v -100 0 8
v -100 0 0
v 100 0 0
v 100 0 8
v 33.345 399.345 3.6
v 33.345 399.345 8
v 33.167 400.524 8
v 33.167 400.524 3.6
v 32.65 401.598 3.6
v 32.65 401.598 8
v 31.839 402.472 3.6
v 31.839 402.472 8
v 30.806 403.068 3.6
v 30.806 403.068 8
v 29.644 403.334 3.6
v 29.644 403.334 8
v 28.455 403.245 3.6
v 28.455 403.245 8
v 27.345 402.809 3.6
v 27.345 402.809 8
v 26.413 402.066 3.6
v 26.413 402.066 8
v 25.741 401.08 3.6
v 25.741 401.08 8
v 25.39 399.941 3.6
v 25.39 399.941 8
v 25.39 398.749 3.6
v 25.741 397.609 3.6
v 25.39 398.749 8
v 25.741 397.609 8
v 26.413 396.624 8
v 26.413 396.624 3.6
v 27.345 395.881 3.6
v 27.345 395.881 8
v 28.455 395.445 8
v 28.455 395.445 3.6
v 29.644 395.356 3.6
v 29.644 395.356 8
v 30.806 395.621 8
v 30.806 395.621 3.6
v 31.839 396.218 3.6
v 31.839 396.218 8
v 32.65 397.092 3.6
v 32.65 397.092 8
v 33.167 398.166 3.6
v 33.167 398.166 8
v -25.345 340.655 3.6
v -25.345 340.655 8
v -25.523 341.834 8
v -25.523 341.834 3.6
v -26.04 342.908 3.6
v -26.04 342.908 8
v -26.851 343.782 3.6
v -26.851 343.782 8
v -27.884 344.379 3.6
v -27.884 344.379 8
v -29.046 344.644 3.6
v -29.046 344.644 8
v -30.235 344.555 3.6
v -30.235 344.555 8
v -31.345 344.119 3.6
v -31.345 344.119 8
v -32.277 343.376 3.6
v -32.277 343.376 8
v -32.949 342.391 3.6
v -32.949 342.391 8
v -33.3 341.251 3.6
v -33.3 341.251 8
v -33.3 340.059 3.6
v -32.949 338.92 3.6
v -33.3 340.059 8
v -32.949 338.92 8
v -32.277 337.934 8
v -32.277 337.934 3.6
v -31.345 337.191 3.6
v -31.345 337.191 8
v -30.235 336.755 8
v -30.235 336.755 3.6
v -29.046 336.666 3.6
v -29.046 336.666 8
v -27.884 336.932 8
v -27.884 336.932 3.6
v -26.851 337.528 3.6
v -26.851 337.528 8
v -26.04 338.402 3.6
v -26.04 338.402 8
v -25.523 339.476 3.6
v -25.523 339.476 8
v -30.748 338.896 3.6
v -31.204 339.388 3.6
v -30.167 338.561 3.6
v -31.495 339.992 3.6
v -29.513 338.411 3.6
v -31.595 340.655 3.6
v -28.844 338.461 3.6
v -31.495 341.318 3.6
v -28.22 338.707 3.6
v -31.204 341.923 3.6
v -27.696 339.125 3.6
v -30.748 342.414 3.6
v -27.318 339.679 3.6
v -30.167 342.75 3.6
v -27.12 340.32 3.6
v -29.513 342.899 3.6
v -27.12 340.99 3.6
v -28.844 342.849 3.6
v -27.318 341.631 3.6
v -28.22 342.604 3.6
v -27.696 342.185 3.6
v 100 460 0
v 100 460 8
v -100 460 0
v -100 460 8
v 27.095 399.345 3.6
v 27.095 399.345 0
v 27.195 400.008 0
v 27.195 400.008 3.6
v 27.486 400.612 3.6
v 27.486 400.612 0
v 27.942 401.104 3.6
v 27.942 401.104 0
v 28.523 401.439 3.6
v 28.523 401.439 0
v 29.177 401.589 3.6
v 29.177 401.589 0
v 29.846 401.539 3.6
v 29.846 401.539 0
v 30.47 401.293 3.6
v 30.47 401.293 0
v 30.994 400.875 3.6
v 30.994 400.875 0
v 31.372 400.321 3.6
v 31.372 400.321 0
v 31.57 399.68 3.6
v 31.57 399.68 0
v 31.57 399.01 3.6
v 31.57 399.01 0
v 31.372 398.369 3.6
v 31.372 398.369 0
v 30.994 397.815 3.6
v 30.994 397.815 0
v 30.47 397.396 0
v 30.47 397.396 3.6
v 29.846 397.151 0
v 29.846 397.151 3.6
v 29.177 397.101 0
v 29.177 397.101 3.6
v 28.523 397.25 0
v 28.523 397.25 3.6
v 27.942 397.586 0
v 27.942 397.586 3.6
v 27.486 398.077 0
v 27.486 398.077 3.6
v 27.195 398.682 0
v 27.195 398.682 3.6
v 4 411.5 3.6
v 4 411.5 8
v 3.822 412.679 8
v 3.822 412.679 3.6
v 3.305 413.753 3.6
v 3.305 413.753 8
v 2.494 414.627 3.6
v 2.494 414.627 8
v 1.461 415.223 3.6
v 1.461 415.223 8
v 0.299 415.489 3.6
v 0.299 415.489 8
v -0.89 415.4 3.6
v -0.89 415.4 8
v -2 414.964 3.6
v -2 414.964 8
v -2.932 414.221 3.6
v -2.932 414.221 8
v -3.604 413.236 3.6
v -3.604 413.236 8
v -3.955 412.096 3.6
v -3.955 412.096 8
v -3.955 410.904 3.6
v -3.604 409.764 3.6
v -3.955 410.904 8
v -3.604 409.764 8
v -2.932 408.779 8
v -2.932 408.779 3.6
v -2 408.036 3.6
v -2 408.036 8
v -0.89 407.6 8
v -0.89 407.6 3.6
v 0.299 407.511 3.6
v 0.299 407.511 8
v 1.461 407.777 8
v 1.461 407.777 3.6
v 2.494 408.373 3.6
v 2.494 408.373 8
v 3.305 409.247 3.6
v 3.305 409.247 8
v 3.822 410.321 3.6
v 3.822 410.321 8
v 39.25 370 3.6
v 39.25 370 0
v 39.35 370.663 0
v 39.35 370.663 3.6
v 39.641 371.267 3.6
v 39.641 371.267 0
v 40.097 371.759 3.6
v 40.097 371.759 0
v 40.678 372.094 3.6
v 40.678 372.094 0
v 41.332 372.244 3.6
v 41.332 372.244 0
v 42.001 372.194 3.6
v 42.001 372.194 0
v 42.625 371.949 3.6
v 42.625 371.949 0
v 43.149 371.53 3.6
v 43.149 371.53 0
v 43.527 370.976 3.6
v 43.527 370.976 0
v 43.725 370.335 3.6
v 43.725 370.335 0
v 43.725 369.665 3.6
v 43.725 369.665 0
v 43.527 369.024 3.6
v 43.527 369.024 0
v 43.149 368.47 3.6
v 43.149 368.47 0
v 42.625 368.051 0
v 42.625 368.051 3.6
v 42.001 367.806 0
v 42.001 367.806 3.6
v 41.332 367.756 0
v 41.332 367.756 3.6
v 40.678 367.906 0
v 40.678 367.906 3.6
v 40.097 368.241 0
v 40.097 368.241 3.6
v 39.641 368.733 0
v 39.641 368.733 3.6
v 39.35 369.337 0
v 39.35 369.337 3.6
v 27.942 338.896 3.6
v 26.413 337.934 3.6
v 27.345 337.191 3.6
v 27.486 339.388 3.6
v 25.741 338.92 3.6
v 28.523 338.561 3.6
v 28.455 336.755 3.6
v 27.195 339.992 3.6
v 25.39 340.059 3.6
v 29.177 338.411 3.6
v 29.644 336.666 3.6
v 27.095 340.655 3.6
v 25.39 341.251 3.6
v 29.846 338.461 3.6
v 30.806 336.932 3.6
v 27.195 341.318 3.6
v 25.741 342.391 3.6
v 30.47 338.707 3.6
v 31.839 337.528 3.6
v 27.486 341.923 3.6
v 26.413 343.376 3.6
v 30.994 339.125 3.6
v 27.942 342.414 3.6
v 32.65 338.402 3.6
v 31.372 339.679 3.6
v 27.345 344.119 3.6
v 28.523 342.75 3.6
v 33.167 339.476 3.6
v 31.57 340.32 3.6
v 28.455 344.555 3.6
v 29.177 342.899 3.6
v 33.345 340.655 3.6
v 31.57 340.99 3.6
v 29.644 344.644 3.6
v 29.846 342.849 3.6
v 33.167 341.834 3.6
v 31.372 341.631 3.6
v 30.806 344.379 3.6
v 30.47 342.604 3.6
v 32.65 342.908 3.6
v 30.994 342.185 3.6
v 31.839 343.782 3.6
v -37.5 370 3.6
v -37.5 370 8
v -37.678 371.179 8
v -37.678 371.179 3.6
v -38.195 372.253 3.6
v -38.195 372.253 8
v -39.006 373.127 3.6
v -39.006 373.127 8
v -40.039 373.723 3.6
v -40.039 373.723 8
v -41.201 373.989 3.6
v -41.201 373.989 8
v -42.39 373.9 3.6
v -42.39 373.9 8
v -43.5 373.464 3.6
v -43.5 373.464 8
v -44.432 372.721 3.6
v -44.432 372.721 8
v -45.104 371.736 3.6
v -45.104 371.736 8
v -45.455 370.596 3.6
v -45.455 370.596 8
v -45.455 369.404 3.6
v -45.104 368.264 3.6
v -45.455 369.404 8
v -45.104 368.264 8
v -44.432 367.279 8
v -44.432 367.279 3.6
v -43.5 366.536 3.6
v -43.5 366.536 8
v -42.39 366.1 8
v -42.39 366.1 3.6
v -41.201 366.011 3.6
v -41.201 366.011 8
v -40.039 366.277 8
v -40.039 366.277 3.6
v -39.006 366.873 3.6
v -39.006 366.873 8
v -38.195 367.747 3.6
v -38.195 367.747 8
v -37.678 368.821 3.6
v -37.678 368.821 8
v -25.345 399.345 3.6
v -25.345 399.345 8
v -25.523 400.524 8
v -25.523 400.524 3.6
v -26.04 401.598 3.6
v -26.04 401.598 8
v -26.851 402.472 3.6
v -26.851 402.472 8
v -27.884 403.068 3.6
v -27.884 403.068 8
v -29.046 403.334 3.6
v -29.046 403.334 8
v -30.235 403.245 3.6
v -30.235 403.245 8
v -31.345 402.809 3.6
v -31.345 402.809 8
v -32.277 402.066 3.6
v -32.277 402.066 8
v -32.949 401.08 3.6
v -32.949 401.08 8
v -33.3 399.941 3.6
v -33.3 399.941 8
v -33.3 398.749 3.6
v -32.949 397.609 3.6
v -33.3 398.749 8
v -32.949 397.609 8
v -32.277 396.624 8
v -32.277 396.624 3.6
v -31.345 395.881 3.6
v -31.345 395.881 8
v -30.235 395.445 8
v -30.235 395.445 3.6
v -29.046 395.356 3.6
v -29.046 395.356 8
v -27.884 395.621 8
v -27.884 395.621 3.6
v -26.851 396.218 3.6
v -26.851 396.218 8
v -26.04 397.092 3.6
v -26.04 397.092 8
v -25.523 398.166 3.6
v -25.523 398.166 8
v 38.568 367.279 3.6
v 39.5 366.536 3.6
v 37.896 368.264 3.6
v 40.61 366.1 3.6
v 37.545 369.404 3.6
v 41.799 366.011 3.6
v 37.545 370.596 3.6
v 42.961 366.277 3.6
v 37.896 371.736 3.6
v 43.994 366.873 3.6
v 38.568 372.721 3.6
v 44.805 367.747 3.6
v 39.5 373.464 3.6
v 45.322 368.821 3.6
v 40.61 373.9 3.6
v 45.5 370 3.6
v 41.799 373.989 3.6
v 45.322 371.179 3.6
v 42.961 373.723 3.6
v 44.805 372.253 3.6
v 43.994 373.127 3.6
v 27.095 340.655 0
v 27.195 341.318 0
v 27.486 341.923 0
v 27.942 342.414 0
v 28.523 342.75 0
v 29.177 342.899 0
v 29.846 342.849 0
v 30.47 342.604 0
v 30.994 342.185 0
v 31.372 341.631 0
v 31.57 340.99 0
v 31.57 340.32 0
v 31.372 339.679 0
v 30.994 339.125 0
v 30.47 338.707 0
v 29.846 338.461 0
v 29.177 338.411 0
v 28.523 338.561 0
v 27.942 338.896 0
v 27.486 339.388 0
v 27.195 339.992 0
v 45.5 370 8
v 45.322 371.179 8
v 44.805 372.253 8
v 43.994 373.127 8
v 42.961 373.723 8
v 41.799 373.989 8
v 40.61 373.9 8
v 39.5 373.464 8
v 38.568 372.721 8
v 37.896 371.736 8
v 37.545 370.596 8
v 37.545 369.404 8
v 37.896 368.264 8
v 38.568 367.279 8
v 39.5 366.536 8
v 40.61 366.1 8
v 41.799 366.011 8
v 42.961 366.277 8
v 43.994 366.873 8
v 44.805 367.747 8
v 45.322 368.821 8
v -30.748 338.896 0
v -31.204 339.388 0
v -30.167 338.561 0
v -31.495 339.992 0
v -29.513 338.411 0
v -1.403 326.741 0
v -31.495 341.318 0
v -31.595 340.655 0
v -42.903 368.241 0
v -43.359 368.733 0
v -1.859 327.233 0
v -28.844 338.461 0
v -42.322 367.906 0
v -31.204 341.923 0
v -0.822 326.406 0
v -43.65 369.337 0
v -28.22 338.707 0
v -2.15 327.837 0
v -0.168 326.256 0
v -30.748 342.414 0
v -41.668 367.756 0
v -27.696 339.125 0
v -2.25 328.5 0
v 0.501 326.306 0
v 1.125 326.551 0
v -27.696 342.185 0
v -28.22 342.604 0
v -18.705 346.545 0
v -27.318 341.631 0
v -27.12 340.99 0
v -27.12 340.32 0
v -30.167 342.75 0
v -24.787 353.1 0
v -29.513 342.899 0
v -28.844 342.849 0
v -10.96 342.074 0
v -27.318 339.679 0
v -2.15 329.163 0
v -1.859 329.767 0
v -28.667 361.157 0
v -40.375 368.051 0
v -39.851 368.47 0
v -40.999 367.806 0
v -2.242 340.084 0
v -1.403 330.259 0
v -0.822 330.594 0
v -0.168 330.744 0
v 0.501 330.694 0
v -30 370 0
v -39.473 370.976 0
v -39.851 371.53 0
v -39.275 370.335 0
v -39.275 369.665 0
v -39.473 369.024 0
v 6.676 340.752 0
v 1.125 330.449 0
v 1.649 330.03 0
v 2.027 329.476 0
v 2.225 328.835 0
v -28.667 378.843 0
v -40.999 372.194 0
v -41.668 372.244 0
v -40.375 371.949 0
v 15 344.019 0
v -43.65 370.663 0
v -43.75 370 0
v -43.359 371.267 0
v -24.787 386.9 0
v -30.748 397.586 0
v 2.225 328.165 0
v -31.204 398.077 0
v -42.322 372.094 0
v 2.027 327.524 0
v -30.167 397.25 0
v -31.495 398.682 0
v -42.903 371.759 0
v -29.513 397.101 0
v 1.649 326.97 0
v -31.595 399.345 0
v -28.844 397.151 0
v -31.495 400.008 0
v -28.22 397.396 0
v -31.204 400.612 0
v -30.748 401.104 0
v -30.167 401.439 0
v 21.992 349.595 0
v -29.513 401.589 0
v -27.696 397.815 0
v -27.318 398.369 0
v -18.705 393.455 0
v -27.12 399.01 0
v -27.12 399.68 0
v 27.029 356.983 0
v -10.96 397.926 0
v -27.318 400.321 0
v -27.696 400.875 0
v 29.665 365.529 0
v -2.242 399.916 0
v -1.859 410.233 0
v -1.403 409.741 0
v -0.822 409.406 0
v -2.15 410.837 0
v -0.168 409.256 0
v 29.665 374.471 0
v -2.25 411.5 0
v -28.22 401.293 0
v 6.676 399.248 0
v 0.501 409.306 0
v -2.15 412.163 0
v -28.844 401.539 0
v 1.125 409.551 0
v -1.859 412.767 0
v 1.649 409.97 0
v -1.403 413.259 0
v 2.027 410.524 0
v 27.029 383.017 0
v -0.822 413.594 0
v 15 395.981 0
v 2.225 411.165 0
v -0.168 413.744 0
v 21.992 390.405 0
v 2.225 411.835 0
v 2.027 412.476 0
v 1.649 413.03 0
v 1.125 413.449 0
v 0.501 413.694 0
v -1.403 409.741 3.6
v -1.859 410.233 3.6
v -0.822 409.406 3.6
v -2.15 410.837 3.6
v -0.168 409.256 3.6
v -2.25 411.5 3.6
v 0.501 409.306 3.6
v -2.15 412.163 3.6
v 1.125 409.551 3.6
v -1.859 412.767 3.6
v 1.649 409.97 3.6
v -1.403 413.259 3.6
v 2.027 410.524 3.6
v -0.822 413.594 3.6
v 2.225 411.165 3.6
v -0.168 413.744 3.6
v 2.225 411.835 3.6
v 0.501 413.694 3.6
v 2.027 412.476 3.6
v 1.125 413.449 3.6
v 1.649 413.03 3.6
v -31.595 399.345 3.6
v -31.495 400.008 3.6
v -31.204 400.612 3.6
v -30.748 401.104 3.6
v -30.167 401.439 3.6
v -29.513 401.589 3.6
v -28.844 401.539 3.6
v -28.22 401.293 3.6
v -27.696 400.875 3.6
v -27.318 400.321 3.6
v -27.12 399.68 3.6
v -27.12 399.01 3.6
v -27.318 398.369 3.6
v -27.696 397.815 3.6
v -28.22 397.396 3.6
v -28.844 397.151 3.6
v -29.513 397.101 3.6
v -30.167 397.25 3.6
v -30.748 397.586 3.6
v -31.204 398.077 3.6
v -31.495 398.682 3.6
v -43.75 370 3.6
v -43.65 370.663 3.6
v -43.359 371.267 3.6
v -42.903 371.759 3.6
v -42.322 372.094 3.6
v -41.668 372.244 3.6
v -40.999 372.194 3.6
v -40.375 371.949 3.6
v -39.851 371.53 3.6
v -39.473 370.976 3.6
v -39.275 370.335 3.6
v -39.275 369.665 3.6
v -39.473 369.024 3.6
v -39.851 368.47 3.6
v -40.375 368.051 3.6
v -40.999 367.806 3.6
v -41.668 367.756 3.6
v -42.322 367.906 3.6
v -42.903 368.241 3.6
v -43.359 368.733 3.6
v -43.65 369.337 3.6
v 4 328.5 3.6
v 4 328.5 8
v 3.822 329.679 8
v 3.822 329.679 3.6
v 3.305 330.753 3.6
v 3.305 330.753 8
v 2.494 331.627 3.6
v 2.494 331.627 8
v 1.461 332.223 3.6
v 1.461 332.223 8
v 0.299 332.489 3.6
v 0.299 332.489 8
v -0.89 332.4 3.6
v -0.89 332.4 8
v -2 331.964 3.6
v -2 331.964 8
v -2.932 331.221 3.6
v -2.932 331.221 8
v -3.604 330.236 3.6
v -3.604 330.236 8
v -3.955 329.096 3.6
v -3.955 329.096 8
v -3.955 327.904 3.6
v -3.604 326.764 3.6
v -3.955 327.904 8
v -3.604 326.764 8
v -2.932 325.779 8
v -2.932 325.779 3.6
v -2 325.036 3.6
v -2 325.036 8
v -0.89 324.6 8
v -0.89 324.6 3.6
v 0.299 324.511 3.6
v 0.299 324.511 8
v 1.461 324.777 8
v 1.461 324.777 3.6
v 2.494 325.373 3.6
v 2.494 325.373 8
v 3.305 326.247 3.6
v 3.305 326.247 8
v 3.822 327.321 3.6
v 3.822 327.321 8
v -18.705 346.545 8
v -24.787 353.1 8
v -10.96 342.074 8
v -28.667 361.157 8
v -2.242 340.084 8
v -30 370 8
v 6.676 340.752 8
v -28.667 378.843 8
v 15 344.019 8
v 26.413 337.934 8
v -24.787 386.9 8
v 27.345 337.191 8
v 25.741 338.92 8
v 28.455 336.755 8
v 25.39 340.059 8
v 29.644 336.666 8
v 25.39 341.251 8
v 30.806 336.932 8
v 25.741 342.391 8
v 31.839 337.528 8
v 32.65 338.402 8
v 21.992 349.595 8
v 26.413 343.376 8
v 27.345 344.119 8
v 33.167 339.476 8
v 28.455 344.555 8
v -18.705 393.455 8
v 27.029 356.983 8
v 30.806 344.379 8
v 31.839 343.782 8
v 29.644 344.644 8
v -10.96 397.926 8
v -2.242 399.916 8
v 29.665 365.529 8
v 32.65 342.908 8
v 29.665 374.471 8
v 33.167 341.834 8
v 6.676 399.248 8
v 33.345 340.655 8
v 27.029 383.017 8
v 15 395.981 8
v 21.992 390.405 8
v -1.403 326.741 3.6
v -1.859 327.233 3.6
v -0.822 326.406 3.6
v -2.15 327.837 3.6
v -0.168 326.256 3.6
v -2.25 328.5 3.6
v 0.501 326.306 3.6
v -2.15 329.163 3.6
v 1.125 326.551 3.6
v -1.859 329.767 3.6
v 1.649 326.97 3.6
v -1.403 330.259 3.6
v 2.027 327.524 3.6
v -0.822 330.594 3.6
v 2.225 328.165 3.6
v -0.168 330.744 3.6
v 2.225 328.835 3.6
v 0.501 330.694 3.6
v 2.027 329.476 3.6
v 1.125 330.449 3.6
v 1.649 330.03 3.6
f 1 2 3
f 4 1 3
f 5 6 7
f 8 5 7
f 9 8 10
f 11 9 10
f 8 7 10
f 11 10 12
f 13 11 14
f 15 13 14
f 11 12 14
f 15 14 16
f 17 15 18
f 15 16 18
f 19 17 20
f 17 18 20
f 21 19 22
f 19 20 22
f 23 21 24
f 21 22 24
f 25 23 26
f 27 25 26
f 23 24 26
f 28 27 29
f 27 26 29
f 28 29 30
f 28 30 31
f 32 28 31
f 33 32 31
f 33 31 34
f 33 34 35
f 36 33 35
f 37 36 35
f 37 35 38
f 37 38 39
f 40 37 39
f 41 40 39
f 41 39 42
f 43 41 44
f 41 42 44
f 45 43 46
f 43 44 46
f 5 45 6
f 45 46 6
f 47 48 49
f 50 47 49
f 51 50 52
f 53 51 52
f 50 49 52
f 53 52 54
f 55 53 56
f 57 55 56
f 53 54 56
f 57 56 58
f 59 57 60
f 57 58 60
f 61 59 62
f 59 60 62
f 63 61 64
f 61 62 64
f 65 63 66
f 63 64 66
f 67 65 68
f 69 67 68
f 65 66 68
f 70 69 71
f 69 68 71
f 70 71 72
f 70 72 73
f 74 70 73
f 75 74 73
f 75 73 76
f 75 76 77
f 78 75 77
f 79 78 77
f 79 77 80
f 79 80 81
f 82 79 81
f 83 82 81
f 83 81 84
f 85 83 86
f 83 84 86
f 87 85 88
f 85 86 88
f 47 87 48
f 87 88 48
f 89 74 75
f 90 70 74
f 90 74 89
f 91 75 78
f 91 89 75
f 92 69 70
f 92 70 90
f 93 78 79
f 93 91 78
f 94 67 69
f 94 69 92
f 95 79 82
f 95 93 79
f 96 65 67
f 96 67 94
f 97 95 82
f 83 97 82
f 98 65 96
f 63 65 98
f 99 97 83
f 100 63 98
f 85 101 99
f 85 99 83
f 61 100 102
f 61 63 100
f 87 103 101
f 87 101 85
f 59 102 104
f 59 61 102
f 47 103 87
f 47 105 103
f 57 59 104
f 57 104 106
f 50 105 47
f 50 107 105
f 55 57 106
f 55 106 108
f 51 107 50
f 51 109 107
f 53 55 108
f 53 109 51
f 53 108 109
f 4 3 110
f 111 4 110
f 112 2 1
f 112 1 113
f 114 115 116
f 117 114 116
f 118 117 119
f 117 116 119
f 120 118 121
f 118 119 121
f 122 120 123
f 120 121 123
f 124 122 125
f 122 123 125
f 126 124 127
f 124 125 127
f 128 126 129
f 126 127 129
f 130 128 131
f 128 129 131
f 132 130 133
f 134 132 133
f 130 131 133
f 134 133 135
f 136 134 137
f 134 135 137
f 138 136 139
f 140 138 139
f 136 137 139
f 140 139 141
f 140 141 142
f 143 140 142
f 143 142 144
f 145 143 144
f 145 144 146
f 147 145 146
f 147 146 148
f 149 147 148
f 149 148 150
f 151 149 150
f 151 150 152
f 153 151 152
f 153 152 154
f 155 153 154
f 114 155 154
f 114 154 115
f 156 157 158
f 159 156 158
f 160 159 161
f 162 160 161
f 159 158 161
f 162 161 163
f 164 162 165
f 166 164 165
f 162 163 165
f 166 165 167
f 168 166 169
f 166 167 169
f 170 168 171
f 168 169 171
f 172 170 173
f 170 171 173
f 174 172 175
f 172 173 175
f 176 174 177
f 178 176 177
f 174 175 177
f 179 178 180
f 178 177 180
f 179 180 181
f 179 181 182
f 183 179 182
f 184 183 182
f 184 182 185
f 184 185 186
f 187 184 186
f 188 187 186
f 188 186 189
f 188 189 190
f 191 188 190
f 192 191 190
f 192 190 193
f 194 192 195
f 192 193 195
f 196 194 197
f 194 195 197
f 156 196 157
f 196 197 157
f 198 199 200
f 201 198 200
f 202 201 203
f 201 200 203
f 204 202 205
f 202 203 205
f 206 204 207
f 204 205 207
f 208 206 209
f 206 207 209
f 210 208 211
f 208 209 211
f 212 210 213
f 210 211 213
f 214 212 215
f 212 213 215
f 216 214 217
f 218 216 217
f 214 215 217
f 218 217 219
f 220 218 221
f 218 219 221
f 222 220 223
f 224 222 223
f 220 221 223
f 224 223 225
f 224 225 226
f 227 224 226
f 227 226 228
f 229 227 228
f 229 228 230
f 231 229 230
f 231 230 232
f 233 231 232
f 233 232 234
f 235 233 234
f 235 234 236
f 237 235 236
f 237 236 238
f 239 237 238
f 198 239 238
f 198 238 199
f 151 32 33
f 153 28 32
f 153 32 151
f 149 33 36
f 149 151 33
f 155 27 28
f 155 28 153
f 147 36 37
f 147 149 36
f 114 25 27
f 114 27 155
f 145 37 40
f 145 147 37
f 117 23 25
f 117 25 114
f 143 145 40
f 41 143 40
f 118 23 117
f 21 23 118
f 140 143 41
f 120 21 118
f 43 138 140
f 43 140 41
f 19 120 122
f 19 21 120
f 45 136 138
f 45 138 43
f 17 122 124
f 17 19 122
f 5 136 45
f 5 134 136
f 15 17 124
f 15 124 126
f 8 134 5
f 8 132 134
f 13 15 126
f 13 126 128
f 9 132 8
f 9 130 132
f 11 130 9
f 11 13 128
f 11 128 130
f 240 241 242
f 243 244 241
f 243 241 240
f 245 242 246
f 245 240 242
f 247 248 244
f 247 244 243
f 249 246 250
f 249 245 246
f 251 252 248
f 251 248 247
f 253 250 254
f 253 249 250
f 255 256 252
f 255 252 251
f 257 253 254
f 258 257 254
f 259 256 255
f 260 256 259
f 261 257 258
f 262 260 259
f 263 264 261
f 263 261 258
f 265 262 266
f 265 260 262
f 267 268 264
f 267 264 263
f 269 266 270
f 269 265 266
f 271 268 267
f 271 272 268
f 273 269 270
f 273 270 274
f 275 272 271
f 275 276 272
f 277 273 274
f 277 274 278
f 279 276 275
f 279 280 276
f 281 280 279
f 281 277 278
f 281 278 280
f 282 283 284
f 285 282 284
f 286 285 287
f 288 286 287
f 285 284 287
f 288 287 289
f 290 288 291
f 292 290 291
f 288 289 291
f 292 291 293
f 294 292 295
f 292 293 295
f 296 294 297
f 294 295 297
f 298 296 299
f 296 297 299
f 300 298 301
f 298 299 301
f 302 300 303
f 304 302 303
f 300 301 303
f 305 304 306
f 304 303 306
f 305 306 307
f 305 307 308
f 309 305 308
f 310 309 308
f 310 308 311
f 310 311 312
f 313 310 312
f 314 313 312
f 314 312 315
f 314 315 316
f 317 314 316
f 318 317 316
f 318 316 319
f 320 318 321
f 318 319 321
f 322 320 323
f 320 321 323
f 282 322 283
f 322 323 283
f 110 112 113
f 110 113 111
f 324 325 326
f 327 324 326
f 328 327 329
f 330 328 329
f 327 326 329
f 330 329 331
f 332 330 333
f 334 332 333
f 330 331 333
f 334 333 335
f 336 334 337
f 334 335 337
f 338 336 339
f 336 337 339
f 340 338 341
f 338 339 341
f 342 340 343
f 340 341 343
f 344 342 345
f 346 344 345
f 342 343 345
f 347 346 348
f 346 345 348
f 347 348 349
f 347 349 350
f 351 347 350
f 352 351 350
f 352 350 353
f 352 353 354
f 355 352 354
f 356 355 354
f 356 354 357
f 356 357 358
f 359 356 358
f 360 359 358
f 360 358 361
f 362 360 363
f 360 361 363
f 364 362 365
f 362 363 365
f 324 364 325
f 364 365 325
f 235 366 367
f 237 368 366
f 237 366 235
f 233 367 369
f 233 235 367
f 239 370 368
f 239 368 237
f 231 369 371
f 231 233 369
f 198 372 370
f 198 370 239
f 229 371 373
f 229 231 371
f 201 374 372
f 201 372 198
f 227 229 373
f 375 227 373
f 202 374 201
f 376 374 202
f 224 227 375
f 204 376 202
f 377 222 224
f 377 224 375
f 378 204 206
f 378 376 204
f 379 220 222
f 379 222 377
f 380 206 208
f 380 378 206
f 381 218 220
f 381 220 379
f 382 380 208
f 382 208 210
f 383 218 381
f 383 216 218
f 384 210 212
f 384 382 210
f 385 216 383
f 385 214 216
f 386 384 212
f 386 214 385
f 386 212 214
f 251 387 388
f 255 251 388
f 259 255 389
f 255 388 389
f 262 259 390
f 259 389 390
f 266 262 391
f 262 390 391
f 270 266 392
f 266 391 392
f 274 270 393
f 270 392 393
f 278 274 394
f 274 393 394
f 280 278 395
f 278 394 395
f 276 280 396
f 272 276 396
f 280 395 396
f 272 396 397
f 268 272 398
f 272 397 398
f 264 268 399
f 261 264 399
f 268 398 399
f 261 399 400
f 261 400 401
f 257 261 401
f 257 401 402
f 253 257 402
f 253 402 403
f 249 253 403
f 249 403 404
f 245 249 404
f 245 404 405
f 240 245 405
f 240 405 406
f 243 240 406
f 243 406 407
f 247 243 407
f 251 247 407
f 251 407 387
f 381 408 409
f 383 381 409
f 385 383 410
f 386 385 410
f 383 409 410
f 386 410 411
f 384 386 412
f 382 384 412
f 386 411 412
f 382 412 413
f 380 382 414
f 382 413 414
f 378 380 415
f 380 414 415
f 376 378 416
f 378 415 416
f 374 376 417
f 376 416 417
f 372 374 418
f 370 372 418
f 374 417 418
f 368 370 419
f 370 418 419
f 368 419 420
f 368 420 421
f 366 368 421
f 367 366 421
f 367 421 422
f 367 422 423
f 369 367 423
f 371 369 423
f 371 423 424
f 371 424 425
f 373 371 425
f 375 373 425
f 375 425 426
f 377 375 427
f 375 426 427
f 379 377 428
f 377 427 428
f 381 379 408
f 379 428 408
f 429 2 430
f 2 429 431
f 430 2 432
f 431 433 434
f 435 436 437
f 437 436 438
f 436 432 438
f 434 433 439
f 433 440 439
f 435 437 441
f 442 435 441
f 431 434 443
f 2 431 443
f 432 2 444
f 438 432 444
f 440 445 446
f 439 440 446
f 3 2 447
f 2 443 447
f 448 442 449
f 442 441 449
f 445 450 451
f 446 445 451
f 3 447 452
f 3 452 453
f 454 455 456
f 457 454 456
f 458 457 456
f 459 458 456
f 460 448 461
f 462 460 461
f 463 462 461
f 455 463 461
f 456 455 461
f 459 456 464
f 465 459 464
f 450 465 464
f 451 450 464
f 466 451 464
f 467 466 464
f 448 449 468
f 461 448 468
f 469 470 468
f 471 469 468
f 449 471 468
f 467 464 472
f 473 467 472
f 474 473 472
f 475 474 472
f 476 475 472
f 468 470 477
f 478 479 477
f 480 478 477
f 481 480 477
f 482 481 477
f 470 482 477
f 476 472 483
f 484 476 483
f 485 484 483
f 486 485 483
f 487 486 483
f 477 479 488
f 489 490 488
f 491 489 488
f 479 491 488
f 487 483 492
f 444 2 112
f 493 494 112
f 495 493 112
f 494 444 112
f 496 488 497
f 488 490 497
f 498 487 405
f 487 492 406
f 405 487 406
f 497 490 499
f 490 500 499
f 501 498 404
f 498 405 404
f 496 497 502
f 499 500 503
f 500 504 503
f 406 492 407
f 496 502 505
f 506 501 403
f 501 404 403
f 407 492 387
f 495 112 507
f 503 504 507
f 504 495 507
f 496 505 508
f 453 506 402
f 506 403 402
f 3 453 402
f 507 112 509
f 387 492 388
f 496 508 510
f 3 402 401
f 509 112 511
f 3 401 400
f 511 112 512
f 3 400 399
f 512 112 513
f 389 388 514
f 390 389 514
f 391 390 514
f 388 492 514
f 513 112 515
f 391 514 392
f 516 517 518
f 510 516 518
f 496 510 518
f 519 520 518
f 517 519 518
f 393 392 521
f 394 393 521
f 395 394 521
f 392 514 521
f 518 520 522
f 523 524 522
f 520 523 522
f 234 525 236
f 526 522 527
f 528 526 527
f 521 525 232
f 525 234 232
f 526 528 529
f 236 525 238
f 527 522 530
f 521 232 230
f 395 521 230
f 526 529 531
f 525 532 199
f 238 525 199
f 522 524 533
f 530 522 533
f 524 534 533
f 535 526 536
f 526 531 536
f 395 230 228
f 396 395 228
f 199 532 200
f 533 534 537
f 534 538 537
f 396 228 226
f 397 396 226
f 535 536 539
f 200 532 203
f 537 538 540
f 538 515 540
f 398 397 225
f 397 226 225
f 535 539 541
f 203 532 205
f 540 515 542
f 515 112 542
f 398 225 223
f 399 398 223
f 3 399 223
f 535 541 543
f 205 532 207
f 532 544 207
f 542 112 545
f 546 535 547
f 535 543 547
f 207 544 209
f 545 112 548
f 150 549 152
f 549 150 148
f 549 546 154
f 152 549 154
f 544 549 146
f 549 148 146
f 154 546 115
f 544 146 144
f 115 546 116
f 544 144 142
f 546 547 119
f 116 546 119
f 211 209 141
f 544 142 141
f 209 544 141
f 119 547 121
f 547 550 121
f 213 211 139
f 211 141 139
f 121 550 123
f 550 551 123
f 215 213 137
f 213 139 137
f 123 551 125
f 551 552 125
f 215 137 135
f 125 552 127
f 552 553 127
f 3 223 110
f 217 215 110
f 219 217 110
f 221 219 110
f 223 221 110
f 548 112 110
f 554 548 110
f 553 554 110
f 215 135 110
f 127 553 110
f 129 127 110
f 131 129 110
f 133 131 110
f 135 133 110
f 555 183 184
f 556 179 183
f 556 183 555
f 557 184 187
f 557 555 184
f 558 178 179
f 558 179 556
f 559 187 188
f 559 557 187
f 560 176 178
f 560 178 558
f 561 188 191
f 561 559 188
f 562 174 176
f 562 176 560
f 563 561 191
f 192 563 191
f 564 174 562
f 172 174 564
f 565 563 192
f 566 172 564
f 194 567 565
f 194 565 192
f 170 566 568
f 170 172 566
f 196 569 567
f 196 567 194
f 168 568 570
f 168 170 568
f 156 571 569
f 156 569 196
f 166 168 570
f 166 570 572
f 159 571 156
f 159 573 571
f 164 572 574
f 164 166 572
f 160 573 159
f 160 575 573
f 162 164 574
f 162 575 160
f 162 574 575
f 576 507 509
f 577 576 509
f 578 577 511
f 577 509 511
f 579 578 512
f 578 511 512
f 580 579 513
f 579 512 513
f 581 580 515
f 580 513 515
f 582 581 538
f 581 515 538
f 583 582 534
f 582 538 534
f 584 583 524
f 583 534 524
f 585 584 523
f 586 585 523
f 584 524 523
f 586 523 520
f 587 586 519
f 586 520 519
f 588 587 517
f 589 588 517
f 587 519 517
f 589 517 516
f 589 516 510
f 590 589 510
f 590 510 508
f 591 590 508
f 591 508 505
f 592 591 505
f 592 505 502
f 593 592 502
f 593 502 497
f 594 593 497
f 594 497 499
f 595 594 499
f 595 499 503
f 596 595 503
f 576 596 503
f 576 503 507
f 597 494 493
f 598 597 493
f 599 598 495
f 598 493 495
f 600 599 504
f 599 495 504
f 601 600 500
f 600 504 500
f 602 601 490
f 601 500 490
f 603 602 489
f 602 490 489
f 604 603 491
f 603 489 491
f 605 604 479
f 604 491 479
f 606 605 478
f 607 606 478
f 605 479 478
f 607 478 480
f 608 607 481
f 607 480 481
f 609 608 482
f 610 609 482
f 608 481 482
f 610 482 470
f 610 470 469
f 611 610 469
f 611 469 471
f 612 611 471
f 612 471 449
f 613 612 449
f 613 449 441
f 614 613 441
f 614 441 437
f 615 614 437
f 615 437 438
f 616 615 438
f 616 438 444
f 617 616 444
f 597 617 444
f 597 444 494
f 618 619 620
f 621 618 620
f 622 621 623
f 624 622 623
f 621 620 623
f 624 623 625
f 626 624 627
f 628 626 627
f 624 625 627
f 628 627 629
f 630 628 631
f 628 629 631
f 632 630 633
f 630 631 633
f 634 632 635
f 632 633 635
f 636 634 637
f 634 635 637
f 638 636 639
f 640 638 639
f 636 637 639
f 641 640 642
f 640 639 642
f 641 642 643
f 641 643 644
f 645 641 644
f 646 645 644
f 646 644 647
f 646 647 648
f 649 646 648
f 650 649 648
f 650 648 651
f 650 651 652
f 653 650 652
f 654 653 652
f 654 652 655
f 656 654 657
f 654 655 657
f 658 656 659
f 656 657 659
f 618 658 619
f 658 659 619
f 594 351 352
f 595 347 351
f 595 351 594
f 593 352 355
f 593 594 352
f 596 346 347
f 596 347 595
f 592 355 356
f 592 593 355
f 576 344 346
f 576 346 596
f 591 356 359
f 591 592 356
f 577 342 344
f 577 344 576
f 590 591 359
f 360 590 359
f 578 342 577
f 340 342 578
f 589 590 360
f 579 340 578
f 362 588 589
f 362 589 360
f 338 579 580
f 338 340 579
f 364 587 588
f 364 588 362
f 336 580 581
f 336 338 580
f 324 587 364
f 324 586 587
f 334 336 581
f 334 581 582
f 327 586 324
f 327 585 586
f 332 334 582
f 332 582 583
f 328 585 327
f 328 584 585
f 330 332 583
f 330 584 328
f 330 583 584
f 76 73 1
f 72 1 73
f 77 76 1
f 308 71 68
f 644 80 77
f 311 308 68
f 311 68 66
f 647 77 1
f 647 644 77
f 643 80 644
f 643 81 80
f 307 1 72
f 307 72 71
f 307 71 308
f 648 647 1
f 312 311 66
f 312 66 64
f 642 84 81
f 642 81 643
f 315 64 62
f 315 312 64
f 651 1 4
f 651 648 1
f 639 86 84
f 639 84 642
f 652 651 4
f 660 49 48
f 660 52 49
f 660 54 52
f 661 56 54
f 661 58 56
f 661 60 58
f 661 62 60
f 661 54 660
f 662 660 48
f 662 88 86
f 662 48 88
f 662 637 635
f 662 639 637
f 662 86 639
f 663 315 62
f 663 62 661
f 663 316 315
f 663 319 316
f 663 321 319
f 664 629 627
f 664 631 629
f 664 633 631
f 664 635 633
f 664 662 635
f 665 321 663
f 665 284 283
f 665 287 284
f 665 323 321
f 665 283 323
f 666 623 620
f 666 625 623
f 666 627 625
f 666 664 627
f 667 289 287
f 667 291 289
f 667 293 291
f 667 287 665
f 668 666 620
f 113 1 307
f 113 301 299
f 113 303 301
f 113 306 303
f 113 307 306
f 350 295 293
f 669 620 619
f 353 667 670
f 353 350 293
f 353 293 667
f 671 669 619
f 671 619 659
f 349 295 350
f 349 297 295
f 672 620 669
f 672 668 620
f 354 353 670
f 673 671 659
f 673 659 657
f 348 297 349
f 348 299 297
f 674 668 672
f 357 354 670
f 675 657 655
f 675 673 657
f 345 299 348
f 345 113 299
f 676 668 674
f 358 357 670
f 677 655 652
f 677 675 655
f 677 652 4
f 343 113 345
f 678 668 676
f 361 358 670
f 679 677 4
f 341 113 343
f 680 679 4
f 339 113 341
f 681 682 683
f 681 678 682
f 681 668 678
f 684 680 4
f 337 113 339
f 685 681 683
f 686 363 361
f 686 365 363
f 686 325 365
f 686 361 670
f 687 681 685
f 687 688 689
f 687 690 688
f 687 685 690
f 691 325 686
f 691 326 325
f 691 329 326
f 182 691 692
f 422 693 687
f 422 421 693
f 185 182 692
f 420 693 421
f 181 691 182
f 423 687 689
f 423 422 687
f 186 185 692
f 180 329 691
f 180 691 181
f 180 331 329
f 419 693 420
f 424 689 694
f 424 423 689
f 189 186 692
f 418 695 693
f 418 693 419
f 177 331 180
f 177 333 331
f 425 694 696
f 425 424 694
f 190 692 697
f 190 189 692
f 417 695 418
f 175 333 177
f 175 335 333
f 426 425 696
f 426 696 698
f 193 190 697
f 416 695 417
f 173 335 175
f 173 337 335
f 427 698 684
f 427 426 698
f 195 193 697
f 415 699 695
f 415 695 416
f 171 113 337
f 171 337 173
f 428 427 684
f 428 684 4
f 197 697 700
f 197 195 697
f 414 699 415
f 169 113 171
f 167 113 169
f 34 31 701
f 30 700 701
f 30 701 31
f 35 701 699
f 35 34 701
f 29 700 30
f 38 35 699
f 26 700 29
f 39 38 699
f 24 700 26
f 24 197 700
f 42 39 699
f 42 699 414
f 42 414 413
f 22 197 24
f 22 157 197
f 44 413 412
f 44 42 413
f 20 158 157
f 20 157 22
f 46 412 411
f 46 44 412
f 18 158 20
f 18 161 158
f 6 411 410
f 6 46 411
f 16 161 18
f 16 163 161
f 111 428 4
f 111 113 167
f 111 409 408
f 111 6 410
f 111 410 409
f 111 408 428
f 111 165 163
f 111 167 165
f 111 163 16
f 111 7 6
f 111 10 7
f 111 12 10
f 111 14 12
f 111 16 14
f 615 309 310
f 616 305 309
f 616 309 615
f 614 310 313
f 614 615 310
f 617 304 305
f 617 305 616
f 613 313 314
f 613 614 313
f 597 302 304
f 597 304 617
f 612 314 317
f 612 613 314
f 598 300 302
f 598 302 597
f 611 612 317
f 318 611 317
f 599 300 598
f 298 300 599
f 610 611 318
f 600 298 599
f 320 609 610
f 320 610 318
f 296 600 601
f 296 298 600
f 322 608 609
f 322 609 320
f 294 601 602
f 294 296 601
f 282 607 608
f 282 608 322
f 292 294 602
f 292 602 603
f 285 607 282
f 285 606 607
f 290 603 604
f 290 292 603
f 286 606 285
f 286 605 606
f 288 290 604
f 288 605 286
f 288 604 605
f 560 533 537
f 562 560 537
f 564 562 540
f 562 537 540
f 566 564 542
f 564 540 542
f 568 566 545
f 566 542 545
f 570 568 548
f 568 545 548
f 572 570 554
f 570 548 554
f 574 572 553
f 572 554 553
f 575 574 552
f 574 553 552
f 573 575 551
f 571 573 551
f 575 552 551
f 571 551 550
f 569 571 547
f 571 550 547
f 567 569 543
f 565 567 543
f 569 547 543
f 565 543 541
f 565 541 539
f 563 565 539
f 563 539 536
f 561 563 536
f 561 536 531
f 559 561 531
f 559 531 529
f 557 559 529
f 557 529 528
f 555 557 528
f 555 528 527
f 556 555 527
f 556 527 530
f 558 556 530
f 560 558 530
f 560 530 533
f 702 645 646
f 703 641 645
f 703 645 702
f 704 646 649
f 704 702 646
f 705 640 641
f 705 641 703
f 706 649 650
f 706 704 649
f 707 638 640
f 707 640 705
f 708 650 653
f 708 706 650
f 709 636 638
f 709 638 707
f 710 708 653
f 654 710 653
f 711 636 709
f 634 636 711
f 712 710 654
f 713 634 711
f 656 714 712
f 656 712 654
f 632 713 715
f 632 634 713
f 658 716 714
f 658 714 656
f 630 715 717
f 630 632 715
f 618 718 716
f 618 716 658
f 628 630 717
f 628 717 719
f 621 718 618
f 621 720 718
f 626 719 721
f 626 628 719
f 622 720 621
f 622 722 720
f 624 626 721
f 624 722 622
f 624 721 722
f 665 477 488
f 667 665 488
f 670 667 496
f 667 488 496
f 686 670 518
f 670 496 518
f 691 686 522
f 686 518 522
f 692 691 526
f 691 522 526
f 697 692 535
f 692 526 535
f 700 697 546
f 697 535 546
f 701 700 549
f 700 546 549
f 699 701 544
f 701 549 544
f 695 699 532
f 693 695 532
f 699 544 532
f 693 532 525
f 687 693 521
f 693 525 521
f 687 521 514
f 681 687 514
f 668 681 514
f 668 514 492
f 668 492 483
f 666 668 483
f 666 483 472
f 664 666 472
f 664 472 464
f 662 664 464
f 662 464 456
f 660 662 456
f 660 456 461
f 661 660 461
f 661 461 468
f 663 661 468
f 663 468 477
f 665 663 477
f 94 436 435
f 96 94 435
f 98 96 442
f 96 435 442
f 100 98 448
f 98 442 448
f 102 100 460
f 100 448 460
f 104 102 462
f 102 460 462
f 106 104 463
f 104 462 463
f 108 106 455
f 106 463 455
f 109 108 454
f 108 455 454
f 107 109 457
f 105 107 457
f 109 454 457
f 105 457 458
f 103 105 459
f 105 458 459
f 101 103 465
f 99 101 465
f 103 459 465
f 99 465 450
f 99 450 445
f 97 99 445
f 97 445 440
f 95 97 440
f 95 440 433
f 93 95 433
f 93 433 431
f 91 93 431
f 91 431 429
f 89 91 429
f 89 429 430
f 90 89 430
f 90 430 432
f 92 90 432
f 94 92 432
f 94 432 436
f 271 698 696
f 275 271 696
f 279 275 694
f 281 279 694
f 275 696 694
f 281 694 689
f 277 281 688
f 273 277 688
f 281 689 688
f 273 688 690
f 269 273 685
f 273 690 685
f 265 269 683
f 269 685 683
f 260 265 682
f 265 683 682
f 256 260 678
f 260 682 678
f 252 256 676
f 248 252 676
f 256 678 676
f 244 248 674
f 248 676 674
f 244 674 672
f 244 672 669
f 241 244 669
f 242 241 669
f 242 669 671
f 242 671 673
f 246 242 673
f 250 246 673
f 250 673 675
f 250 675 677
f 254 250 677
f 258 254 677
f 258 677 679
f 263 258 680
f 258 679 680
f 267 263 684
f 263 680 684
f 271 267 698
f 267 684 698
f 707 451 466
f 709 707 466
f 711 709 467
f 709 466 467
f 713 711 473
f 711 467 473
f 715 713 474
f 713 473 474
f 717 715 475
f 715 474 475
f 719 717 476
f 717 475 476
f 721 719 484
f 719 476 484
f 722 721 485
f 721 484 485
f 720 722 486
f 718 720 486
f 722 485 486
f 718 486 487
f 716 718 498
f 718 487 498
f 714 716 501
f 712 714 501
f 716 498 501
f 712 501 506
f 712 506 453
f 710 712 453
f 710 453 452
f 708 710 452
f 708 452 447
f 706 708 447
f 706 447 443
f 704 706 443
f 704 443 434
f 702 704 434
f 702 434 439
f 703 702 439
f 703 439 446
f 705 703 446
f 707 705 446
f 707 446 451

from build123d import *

# Parameters (mm, degrees)
SKETCH_1_W          = 200
SKETCH_1_H          = 460
EXTRUDE_1_DEPTH     = 8
SKETCH_2_R          = 30
CUT_EXTRUDE_1_DEPTH = 10
SKETCH_3_R          = 2.25
CUT_EXTRUDE_2_DEPTH = 10
SKETCH_4_R          = 4
CUT_EXTRUDE_3_DEPTH = 4.4


with BuildPart() as part:
    # 草图1 → 凸台-拉伸1 (new body)
    with BuildSketch(Plane.XY):
        with Locations((0, 230)):
            Rectangle(SKETCH_1_W, SKETCH_1_H)
    extrude(amount=EXTRUDE_1_DEPTH)

    # 草图2 → 切除-拉伸1 (cut)
    with BuildSketch(Plane(origin=(0, 0, 0), x_dir=(-1, 0, 0), z_dir=(0, 0, -1))):
        with Locations((0, 370)):
            Circle(SKETCH_2_R)
    extrude(amount=-CUT_EXTRUDE_1_DEPTH, mode=Mode.SUBTRACT)

    # 草图3 → 切除-拉伸2 (cut)
    with BuildSketch(Plane(origin=(0, 0, 0), x_dir=(-1, 0, 0), z_dir=(0, 0, -1))):
        with Locations((0, 411.5)):
            Circle(SKETCH_3_R)
        with Locations((29.344931419, 399.344931419)):
            Circle(SKETCH_3_R)
        with Locations((41.5, 370)):
            Circle(SKETCH_3_R)
        with Locations((29.344931419, 340.655068581)):
            Circle(SKETCH_3_R)
        with Locations((0, 328.5)):
            Circle(SKETCH_3_R)
        with Locations((-29.344931419, 340.655068581)):
            Circle(SKETCH_3_R)
        with Locations((-41.5, 370)):
            Circle(SKETCH_3_R)
        with Locations((-29.344931419, 399.344931419)):
            Circle(SKETCH_3_R)
    extrude(amount=-CUT_EXTRUDE_2_DEPTH, mode=Mode.SUBTRACT)

    # 草图4 → 切除-拉伸3 (cut)
    with BuildSketch(Plane.XY.offset(8)):
        with Locations((29.344931419, 399.344931419)):
            Circle(SKETCH_4_R)
        with Locations((41.5, 370)):
            Circle(SKETCH_4_R)
        with Locations((29.344931419, 340.655068581)):
            Circle(SKETCH_4_R)
        with Locations((0, 328.5)):
            Circle(SKETCH_4_R)
        with Locations((-29.344931419, 340.655068581)):
            Circle(SKETCH_4_R)
        with Locations((-41.5, 370)):
            Circle(SKETCH_4_R)
        with Locations((-29.344931419, 399.344931419)):
            Circle(SKETCH_4_R)
        with Locations((0, 411.5)):
            Circle(SKETCH_4_R)
    extrude(amount=-CUT_EXTRUDE_3_DEPTH, mode=Mode.SUBTRACT)


solid = part.part
